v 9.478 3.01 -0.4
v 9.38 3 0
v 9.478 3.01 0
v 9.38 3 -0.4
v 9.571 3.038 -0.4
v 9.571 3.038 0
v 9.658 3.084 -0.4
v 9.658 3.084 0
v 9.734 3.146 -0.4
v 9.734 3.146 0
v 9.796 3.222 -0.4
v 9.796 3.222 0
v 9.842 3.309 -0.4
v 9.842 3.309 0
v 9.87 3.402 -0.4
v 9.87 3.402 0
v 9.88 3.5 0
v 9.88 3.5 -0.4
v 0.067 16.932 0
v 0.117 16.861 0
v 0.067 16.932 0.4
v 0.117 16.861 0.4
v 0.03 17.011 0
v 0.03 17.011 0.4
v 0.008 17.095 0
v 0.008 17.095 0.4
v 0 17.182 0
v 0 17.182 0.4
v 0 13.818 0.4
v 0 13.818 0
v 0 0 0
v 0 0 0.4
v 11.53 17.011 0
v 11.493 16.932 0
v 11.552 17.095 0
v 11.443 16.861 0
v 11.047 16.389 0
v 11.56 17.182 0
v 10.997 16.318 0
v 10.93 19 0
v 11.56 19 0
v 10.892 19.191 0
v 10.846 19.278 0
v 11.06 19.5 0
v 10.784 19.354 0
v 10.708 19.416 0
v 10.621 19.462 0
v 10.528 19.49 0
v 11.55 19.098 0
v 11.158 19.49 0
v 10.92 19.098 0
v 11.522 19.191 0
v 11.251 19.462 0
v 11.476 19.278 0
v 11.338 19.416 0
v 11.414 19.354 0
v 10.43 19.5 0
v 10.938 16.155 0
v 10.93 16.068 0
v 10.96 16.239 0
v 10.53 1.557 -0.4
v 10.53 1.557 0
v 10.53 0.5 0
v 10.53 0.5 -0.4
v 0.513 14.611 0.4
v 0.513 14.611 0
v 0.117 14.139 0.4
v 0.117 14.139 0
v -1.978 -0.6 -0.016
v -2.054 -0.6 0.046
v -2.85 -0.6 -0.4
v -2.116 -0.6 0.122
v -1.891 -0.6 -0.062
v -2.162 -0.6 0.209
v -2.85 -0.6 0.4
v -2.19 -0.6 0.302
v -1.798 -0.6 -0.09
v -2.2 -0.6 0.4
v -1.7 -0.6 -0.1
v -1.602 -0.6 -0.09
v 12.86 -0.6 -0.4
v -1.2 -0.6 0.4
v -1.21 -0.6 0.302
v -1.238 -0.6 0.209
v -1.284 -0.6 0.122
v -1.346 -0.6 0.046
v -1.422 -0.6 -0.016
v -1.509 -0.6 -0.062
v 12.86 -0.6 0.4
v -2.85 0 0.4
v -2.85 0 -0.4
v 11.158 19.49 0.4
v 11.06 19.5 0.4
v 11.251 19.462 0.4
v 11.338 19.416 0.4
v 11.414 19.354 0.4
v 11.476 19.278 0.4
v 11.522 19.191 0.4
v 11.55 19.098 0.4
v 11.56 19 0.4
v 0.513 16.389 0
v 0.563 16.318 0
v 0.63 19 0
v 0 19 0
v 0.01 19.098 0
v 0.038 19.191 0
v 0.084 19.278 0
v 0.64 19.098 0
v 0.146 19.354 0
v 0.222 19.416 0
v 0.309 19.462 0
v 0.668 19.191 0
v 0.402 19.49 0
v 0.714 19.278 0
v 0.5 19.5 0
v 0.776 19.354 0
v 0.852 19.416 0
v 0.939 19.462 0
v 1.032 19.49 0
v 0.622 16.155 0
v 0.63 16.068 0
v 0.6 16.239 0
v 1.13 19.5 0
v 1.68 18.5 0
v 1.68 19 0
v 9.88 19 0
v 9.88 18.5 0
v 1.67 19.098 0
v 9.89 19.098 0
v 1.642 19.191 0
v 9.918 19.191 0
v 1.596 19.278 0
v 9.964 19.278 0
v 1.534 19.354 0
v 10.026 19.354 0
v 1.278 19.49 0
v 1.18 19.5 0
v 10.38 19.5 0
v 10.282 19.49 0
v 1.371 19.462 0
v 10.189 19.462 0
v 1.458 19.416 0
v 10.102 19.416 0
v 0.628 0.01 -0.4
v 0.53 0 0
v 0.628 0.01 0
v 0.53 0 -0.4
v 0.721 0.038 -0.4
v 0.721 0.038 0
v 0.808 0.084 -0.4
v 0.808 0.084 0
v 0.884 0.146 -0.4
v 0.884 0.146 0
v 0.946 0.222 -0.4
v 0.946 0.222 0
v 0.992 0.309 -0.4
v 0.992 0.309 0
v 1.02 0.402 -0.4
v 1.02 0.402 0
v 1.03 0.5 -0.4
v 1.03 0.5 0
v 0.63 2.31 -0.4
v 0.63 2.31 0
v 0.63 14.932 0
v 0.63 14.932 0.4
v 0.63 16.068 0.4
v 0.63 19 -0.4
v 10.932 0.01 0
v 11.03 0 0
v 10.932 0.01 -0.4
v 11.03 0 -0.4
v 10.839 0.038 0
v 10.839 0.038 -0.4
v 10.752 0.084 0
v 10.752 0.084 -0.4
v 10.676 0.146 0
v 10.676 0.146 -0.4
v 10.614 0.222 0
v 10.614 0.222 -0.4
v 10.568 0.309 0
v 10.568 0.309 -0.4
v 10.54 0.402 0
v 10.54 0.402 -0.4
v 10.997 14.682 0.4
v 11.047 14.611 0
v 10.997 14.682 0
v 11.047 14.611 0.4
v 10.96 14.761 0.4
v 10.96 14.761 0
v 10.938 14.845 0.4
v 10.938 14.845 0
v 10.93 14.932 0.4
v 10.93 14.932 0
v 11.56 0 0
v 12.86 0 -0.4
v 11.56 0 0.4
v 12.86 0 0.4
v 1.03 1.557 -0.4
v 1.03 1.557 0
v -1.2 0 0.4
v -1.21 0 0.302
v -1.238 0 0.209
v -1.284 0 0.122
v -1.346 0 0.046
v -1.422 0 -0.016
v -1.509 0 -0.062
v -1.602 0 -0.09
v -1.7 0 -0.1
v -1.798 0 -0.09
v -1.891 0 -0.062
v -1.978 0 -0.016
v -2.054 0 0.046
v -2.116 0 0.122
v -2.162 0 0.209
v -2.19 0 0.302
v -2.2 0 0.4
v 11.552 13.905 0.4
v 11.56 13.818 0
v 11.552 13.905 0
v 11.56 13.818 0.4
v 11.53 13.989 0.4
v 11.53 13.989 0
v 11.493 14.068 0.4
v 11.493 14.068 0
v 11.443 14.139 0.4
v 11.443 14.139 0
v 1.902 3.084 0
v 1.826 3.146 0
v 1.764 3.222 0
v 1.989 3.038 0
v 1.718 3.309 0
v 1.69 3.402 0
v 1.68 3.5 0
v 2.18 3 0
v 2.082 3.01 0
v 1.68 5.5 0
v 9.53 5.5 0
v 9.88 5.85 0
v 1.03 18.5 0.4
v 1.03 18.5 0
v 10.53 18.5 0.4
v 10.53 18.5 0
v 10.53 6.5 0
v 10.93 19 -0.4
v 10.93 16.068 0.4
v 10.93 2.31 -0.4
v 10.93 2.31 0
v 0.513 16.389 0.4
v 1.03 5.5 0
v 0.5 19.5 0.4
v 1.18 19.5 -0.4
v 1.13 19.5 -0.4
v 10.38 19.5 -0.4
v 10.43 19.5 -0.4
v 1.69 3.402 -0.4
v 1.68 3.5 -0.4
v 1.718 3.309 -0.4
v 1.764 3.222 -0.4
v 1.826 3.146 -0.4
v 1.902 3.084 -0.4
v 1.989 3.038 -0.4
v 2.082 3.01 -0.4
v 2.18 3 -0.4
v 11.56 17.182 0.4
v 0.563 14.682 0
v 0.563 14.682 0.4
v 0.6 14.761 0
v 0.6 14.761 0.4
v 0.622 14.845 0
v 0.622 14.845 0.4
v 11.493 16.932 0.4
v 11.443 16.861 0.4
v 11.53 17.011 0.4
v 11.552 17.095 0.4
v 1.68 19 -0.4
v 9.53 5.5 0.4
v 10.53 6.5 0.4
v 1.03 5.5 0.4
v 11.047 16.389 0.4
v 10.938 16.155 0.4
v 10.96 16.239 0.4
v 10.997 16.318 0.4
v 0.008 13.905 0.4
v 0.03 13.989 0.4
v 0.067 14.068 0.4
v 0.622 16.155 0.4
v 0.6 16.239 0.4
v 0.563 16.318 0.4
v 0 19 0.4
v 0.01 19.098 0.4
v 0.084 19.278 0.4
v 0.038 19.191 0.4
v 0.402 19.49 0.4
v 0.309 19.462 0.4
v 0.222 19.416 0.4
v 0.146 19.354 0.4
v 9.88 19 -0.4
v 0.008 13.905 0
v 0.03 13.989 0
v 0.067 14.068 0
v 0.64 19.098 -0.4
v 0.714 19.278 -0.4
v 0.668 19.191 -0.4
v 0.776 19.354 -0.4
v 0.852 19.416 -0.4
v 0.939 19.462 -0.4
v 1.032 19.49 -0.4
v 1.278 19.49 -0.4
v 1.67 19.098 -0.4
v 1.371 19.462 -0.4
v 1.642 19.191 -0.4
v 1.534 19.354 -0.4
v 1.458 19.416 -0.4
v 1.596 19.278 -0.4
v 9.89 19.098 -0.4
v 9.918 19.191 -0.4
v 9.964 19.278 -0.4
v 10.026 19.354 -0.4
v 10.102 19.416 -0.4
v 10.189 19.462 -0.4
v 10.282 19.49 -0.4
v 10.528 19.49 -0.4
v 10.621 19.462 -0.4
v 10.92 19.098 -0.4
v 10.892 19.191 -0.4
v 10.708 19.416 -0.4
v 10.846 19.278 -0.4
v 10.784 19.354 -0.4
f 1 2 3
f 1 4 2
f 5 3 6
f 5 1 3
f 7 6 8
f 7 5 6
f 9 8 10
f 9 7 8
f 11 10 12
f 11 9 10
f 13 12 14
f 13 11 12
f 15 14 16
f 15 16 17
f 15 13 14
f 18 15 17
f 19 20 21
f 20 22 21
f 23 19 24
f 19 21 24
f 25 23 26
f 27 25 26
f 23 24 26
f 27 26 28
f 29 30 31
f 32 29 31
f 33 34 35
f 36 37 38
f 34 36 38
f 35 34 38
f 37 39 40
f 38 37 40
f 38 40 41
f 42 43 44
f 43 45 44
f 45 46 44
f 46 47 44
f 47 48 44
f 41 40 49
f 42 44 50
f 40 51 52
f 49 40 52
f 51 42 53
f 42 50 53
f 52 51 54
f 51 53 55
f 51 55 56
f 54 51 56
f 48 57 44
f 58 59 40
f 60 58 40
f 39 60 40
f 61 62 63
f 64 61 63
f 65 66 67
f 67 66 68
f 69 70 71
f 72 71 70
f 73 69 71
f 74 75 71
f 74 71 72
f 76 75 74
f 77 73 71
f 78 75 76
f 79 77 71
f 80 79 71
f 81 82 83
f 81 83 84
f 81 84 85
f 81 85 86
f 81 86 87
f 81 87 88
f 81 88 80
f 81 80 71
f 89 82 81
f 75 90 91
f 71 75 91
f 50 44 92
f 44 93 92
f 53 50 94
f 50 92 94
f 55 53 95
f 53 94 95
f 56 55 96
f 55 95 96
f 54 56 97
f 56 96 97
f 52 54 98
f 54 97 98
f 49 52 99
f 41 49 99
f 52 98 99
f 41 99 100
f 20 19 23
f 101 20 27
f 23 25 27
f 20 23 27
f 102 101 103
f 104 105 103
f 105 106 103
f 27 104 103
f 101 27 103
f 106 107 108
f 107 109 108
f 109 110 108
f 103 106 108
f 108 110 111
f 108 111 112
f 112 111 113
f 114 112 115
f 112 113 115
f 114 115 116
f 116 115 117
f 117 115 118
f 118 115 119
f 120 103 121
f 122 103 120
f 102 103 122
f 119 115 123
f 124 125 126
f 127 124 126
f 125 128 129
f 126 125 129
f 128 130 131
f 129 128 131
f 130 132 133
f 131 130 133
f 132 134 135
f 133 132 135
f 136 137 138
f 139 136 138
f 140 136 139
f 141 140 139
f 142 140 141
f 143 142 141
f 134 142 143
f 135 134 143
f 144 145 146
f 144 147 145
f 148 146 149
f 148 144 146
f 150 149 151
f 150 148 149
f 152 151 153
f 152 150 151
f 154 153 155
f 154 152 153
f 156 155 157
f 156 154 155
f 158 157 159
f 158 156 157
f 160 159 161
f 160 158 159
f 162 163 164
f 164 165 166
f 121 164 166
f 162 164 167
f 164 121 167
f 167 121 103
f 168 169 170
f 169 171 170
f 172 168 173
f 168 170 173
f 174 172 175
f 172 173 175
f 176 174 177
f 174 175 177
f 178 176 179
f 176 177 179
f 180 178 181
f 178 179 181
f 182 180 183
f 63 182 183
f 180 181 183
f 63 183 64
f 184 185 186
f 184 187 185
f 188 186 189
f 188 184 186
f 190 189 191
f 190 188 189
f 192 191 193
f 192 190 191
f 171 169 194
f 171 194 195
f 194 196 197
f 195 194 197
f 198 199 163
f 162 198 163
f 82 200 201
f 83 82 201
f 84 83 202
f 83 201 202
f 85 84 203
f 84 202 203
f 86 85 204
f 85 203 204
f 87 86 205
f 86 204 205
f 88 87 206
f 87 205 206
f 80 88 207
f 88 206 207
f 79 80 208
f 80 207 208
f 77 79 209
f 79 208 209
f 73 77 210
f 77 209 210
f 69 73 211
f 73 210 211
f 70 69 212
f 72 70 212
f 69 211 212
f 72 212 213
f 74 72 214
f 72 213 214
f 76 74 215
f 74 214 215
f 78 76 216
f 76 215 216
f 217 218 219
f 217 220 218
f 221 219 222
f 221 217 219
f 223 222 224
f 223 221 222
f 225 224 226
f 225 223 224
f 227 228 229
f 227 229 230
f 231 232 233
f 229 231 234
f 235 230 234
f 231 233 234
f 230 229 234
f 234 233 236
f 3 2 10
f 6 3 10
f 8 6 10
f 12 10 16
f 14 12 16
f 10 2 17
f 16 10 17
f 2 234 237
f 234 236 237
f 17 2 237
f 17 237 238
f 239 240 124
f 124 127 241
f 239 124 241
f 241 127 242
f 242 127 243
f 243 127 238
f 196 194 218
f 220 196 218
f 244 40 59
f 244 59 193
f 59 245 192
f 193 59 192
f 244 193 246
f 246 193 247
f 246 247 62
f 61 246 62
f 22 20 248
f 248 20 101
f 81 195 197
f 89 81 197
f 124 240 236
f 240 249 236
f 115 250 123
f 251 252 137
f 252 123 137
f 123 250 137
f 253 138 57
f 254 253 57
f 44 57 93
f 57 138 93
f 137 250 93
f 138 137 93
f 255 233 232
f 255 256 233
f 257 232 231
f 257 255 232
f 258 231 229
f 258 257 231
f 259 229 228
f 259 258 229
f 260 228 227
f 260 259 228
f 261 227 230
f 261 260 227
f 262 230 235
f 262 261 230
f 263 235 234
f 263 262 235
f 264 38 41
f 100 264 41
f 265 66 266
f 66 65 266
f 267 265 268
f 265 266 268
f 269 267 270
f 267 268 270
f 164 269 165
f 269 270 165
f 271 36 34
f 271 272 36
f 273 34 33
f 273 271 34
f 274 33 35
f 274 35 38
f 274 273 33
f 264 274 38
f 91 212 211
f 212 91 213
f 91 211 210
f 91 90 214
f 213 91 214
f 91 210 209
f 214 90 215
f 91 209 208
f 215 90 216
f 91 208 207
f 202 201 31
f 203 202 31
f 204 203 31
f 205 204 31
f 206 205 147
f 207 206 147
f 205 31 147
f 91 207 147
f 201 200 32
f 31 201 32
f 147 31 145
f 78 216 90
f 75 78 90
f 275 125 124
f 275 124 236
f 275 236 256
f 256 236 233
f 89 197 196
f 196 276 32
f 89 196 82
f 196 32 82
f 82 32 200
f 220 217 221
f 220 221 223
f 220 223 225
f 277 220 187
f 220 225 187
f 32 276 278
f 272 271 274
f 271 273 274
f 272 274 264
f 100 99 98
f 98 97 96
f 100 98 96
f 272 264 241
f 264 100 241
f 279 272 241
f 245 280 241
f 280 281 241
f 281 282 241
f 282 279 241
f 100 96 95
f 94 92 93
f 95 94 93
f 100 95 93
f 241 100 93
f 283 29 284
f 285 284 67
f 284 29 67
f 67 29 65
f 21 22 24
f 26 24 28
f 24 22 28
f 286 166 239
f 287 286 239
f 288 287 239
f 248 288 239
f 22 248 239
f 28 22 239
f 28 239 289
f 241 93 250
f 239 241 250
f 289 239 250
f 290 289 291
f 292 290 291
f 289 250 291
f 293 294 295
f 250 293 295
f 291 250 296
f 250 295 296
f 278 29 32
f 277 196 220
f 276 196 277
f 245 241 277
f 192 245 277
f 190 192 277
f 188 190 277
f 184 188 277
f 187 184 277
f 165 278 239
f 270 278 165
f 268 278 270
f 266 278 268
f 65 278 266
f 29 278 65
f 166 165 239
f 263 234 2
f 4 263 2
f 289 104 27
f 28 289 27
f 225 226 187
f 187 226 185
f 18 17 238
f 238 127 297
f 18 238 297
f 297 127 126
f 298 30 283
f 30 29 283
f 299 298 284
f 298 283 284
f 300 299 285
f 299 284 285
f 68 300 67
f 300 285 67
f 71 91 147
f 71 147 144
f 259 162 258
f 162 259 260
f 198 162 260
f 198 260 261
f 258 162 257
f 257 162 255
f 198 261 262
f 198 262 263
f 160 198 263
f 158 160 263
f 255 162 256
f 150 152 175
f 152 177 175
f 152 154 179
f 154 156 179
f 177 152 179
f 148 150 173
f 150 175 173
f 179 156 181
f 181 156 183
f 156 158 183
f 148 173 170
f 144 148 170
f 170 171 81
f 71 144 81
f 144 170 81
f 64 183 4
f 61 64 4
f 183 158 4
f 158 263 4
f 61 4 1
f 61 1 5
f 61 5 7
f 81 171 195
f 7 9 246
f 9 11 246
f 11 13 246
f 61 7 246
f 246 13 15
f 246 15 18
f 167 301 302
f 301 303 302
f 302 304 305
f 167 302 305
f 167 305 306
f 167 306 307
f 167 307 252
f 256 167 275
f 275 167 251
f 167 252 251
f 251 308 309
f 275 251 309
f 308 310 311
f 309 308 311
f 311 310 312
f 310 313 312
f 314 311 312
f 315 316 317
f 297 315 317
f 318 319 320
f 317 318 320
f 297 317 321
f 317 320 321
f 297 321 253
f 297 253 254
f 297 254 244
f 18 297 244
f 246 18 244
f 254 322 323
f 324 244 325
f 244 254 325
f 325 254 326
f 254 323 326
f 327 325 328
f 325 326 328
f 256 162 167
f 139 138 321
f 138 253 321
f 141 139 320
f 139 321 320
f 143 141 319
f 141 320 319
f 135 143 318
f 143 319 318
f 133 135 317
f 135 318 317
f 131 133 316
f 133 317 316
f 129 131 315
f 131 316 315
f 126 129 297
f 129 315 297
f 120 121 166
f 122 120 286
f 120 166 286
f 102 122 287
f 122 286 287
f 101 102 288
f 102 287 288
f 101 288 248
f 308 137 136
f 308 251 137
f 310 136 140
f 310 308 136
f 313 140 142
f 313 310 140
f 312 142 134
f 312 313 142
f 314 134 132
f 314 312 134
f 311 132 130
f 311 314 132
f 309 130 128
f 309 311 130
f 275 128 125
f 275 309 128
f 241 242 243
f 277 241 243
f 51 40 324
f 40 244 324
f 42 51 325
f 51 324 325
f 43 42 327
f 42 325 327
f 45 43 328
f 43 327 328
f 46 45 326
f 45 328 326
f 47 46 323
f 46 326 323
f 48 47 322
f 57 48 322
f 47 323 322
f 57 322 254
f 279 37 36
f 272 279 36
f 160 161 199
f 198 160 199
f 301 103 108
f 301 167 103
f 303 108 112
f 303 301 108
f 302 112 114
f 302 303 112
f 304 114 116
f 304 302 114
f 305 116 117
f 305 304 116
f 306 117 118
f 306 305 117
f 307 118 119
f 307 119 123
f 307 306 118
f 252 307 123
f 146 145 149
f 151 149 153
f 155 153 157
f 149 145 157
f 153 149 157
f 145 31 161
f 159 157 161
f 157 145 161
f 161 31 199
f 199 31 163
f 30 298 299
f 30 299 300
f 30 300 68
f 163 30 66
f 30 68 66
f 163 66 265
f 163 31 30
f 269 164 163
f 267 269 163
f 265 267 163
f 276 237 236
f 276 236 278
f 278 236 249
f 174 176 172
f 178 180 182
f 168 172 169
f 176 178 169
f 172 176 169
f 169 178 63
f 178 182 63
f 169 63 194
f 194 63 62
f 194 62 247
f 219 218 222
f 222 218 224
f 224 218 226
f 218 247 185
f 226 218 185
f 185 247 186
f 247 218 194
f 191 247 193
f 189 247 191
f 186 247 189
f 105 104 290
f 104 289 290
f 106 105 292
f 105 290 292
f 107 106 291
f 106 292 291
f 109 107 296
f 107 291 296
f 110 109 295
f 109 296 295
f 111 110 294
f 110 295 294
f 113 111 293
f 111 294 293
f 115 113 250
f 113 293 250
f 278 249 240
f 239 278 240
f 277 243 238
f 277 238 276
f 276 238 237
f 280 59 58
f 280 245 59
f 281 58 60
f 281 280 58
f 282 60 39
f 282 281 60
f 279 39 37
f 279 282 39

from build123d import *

# Parameters (mm, degrees)
F1_DEPTH = 0.4
F3_DEPTH = 0.4
F5_DEPTH = 0.6
F6_R     = 0.5


with BuildPart() as f1:
    # F0 (on Top) → F1 (new body)
    with BuildSketch(Plane.XY):
        Polygon((0, 14), (0, 0), (5.78, 0), (11.56, 0), (11.56, 14), (10.93, 14.75), (10.93, 16.25), (11.56, 17), (11.56, 19.5), (5.78, 19.5), (0, 19.5), (0, 17), (0.63, 16.25), (0.63, 14.75), align=None)
        Polygon((10.53, 6.5), (9.53, 5.5), (1.03, 5.5), (1.03, 18.5), (10.53, 18.5), align=None, mode=Mode.SUBTRACT)
    extrude(amount=F1_DEPTH)

    # F2 (on face) → F3 (join)
    with BuildSketch(Plane(origin=(0, 0, 0), x_dir=(1, 0, 0), z_dir=(0, 0, -1))):
        Polygon((0.63, -2.3095843679), (0.63, -19.5), (1.68, -19.5), (1.68, -3), (5.78, -3), (9.88, -3), (9.88, -19.5), (10.93, -19.5), (10.93, -2.3095843679), (10.53, -1.5567192639), (10.53, 0), (5.78, 0), (1.03, 0), (1.03, -1.5567192639), align=None)
    extrude(amount=F3_DEPTH)

    # F4 (on face) → F5 (join)
    with BuildSketch(Plane.XZ):
        with BuildLine():
            Line((-2.2, 0.4), (-2.85, 0.4))
            Line((-2.85, 0.4), (-2.85, -0.4))
            Line((-2.85, -0.4), (12.86, -0.4))
            Line((12.86, -0.4), (12.86, 0.4))
            Line((12.86, 0.4), (-1.2, 0.4))
            ThreePointArc((-1.2, 0.4), (-1.7, -0.1), (-2.2, 0.4))
        make_face()
    extrude(amount=F5_DEPTH)

    # F6
    f6_edges = [f1.edges().sort_by_distance(p)[0] for p in [
        (11.56, 19.5, 0.2),
        (11.56, 17, 0.2),
        (10.93, 16.25, 0.2),
        (10.93, 14.75, 0.2),
        (11.56, 14, 0.2),
        (0, 19.5, 0.2),
        (0, 17, 0.2),
        (0.63, 16.25, 0.2),
        (0, 14, 0.2),
        (0.63, 14.75, 0.2),
        (9.88, 3, -0.2),
        (1.68, 3, -0.2),
        (10.93, 19.5, -0.2),
        (9.88, 19.5, -0.2),
        (1.68, 19.5, -0.2),
        (0.63, 19.5, -0.2),
        (10.53, 0, -0.2),
        (1.03, 0, -0.2),
    ]]
    fillet(f6_edges, radius=F6_R)


solid = f1.part
